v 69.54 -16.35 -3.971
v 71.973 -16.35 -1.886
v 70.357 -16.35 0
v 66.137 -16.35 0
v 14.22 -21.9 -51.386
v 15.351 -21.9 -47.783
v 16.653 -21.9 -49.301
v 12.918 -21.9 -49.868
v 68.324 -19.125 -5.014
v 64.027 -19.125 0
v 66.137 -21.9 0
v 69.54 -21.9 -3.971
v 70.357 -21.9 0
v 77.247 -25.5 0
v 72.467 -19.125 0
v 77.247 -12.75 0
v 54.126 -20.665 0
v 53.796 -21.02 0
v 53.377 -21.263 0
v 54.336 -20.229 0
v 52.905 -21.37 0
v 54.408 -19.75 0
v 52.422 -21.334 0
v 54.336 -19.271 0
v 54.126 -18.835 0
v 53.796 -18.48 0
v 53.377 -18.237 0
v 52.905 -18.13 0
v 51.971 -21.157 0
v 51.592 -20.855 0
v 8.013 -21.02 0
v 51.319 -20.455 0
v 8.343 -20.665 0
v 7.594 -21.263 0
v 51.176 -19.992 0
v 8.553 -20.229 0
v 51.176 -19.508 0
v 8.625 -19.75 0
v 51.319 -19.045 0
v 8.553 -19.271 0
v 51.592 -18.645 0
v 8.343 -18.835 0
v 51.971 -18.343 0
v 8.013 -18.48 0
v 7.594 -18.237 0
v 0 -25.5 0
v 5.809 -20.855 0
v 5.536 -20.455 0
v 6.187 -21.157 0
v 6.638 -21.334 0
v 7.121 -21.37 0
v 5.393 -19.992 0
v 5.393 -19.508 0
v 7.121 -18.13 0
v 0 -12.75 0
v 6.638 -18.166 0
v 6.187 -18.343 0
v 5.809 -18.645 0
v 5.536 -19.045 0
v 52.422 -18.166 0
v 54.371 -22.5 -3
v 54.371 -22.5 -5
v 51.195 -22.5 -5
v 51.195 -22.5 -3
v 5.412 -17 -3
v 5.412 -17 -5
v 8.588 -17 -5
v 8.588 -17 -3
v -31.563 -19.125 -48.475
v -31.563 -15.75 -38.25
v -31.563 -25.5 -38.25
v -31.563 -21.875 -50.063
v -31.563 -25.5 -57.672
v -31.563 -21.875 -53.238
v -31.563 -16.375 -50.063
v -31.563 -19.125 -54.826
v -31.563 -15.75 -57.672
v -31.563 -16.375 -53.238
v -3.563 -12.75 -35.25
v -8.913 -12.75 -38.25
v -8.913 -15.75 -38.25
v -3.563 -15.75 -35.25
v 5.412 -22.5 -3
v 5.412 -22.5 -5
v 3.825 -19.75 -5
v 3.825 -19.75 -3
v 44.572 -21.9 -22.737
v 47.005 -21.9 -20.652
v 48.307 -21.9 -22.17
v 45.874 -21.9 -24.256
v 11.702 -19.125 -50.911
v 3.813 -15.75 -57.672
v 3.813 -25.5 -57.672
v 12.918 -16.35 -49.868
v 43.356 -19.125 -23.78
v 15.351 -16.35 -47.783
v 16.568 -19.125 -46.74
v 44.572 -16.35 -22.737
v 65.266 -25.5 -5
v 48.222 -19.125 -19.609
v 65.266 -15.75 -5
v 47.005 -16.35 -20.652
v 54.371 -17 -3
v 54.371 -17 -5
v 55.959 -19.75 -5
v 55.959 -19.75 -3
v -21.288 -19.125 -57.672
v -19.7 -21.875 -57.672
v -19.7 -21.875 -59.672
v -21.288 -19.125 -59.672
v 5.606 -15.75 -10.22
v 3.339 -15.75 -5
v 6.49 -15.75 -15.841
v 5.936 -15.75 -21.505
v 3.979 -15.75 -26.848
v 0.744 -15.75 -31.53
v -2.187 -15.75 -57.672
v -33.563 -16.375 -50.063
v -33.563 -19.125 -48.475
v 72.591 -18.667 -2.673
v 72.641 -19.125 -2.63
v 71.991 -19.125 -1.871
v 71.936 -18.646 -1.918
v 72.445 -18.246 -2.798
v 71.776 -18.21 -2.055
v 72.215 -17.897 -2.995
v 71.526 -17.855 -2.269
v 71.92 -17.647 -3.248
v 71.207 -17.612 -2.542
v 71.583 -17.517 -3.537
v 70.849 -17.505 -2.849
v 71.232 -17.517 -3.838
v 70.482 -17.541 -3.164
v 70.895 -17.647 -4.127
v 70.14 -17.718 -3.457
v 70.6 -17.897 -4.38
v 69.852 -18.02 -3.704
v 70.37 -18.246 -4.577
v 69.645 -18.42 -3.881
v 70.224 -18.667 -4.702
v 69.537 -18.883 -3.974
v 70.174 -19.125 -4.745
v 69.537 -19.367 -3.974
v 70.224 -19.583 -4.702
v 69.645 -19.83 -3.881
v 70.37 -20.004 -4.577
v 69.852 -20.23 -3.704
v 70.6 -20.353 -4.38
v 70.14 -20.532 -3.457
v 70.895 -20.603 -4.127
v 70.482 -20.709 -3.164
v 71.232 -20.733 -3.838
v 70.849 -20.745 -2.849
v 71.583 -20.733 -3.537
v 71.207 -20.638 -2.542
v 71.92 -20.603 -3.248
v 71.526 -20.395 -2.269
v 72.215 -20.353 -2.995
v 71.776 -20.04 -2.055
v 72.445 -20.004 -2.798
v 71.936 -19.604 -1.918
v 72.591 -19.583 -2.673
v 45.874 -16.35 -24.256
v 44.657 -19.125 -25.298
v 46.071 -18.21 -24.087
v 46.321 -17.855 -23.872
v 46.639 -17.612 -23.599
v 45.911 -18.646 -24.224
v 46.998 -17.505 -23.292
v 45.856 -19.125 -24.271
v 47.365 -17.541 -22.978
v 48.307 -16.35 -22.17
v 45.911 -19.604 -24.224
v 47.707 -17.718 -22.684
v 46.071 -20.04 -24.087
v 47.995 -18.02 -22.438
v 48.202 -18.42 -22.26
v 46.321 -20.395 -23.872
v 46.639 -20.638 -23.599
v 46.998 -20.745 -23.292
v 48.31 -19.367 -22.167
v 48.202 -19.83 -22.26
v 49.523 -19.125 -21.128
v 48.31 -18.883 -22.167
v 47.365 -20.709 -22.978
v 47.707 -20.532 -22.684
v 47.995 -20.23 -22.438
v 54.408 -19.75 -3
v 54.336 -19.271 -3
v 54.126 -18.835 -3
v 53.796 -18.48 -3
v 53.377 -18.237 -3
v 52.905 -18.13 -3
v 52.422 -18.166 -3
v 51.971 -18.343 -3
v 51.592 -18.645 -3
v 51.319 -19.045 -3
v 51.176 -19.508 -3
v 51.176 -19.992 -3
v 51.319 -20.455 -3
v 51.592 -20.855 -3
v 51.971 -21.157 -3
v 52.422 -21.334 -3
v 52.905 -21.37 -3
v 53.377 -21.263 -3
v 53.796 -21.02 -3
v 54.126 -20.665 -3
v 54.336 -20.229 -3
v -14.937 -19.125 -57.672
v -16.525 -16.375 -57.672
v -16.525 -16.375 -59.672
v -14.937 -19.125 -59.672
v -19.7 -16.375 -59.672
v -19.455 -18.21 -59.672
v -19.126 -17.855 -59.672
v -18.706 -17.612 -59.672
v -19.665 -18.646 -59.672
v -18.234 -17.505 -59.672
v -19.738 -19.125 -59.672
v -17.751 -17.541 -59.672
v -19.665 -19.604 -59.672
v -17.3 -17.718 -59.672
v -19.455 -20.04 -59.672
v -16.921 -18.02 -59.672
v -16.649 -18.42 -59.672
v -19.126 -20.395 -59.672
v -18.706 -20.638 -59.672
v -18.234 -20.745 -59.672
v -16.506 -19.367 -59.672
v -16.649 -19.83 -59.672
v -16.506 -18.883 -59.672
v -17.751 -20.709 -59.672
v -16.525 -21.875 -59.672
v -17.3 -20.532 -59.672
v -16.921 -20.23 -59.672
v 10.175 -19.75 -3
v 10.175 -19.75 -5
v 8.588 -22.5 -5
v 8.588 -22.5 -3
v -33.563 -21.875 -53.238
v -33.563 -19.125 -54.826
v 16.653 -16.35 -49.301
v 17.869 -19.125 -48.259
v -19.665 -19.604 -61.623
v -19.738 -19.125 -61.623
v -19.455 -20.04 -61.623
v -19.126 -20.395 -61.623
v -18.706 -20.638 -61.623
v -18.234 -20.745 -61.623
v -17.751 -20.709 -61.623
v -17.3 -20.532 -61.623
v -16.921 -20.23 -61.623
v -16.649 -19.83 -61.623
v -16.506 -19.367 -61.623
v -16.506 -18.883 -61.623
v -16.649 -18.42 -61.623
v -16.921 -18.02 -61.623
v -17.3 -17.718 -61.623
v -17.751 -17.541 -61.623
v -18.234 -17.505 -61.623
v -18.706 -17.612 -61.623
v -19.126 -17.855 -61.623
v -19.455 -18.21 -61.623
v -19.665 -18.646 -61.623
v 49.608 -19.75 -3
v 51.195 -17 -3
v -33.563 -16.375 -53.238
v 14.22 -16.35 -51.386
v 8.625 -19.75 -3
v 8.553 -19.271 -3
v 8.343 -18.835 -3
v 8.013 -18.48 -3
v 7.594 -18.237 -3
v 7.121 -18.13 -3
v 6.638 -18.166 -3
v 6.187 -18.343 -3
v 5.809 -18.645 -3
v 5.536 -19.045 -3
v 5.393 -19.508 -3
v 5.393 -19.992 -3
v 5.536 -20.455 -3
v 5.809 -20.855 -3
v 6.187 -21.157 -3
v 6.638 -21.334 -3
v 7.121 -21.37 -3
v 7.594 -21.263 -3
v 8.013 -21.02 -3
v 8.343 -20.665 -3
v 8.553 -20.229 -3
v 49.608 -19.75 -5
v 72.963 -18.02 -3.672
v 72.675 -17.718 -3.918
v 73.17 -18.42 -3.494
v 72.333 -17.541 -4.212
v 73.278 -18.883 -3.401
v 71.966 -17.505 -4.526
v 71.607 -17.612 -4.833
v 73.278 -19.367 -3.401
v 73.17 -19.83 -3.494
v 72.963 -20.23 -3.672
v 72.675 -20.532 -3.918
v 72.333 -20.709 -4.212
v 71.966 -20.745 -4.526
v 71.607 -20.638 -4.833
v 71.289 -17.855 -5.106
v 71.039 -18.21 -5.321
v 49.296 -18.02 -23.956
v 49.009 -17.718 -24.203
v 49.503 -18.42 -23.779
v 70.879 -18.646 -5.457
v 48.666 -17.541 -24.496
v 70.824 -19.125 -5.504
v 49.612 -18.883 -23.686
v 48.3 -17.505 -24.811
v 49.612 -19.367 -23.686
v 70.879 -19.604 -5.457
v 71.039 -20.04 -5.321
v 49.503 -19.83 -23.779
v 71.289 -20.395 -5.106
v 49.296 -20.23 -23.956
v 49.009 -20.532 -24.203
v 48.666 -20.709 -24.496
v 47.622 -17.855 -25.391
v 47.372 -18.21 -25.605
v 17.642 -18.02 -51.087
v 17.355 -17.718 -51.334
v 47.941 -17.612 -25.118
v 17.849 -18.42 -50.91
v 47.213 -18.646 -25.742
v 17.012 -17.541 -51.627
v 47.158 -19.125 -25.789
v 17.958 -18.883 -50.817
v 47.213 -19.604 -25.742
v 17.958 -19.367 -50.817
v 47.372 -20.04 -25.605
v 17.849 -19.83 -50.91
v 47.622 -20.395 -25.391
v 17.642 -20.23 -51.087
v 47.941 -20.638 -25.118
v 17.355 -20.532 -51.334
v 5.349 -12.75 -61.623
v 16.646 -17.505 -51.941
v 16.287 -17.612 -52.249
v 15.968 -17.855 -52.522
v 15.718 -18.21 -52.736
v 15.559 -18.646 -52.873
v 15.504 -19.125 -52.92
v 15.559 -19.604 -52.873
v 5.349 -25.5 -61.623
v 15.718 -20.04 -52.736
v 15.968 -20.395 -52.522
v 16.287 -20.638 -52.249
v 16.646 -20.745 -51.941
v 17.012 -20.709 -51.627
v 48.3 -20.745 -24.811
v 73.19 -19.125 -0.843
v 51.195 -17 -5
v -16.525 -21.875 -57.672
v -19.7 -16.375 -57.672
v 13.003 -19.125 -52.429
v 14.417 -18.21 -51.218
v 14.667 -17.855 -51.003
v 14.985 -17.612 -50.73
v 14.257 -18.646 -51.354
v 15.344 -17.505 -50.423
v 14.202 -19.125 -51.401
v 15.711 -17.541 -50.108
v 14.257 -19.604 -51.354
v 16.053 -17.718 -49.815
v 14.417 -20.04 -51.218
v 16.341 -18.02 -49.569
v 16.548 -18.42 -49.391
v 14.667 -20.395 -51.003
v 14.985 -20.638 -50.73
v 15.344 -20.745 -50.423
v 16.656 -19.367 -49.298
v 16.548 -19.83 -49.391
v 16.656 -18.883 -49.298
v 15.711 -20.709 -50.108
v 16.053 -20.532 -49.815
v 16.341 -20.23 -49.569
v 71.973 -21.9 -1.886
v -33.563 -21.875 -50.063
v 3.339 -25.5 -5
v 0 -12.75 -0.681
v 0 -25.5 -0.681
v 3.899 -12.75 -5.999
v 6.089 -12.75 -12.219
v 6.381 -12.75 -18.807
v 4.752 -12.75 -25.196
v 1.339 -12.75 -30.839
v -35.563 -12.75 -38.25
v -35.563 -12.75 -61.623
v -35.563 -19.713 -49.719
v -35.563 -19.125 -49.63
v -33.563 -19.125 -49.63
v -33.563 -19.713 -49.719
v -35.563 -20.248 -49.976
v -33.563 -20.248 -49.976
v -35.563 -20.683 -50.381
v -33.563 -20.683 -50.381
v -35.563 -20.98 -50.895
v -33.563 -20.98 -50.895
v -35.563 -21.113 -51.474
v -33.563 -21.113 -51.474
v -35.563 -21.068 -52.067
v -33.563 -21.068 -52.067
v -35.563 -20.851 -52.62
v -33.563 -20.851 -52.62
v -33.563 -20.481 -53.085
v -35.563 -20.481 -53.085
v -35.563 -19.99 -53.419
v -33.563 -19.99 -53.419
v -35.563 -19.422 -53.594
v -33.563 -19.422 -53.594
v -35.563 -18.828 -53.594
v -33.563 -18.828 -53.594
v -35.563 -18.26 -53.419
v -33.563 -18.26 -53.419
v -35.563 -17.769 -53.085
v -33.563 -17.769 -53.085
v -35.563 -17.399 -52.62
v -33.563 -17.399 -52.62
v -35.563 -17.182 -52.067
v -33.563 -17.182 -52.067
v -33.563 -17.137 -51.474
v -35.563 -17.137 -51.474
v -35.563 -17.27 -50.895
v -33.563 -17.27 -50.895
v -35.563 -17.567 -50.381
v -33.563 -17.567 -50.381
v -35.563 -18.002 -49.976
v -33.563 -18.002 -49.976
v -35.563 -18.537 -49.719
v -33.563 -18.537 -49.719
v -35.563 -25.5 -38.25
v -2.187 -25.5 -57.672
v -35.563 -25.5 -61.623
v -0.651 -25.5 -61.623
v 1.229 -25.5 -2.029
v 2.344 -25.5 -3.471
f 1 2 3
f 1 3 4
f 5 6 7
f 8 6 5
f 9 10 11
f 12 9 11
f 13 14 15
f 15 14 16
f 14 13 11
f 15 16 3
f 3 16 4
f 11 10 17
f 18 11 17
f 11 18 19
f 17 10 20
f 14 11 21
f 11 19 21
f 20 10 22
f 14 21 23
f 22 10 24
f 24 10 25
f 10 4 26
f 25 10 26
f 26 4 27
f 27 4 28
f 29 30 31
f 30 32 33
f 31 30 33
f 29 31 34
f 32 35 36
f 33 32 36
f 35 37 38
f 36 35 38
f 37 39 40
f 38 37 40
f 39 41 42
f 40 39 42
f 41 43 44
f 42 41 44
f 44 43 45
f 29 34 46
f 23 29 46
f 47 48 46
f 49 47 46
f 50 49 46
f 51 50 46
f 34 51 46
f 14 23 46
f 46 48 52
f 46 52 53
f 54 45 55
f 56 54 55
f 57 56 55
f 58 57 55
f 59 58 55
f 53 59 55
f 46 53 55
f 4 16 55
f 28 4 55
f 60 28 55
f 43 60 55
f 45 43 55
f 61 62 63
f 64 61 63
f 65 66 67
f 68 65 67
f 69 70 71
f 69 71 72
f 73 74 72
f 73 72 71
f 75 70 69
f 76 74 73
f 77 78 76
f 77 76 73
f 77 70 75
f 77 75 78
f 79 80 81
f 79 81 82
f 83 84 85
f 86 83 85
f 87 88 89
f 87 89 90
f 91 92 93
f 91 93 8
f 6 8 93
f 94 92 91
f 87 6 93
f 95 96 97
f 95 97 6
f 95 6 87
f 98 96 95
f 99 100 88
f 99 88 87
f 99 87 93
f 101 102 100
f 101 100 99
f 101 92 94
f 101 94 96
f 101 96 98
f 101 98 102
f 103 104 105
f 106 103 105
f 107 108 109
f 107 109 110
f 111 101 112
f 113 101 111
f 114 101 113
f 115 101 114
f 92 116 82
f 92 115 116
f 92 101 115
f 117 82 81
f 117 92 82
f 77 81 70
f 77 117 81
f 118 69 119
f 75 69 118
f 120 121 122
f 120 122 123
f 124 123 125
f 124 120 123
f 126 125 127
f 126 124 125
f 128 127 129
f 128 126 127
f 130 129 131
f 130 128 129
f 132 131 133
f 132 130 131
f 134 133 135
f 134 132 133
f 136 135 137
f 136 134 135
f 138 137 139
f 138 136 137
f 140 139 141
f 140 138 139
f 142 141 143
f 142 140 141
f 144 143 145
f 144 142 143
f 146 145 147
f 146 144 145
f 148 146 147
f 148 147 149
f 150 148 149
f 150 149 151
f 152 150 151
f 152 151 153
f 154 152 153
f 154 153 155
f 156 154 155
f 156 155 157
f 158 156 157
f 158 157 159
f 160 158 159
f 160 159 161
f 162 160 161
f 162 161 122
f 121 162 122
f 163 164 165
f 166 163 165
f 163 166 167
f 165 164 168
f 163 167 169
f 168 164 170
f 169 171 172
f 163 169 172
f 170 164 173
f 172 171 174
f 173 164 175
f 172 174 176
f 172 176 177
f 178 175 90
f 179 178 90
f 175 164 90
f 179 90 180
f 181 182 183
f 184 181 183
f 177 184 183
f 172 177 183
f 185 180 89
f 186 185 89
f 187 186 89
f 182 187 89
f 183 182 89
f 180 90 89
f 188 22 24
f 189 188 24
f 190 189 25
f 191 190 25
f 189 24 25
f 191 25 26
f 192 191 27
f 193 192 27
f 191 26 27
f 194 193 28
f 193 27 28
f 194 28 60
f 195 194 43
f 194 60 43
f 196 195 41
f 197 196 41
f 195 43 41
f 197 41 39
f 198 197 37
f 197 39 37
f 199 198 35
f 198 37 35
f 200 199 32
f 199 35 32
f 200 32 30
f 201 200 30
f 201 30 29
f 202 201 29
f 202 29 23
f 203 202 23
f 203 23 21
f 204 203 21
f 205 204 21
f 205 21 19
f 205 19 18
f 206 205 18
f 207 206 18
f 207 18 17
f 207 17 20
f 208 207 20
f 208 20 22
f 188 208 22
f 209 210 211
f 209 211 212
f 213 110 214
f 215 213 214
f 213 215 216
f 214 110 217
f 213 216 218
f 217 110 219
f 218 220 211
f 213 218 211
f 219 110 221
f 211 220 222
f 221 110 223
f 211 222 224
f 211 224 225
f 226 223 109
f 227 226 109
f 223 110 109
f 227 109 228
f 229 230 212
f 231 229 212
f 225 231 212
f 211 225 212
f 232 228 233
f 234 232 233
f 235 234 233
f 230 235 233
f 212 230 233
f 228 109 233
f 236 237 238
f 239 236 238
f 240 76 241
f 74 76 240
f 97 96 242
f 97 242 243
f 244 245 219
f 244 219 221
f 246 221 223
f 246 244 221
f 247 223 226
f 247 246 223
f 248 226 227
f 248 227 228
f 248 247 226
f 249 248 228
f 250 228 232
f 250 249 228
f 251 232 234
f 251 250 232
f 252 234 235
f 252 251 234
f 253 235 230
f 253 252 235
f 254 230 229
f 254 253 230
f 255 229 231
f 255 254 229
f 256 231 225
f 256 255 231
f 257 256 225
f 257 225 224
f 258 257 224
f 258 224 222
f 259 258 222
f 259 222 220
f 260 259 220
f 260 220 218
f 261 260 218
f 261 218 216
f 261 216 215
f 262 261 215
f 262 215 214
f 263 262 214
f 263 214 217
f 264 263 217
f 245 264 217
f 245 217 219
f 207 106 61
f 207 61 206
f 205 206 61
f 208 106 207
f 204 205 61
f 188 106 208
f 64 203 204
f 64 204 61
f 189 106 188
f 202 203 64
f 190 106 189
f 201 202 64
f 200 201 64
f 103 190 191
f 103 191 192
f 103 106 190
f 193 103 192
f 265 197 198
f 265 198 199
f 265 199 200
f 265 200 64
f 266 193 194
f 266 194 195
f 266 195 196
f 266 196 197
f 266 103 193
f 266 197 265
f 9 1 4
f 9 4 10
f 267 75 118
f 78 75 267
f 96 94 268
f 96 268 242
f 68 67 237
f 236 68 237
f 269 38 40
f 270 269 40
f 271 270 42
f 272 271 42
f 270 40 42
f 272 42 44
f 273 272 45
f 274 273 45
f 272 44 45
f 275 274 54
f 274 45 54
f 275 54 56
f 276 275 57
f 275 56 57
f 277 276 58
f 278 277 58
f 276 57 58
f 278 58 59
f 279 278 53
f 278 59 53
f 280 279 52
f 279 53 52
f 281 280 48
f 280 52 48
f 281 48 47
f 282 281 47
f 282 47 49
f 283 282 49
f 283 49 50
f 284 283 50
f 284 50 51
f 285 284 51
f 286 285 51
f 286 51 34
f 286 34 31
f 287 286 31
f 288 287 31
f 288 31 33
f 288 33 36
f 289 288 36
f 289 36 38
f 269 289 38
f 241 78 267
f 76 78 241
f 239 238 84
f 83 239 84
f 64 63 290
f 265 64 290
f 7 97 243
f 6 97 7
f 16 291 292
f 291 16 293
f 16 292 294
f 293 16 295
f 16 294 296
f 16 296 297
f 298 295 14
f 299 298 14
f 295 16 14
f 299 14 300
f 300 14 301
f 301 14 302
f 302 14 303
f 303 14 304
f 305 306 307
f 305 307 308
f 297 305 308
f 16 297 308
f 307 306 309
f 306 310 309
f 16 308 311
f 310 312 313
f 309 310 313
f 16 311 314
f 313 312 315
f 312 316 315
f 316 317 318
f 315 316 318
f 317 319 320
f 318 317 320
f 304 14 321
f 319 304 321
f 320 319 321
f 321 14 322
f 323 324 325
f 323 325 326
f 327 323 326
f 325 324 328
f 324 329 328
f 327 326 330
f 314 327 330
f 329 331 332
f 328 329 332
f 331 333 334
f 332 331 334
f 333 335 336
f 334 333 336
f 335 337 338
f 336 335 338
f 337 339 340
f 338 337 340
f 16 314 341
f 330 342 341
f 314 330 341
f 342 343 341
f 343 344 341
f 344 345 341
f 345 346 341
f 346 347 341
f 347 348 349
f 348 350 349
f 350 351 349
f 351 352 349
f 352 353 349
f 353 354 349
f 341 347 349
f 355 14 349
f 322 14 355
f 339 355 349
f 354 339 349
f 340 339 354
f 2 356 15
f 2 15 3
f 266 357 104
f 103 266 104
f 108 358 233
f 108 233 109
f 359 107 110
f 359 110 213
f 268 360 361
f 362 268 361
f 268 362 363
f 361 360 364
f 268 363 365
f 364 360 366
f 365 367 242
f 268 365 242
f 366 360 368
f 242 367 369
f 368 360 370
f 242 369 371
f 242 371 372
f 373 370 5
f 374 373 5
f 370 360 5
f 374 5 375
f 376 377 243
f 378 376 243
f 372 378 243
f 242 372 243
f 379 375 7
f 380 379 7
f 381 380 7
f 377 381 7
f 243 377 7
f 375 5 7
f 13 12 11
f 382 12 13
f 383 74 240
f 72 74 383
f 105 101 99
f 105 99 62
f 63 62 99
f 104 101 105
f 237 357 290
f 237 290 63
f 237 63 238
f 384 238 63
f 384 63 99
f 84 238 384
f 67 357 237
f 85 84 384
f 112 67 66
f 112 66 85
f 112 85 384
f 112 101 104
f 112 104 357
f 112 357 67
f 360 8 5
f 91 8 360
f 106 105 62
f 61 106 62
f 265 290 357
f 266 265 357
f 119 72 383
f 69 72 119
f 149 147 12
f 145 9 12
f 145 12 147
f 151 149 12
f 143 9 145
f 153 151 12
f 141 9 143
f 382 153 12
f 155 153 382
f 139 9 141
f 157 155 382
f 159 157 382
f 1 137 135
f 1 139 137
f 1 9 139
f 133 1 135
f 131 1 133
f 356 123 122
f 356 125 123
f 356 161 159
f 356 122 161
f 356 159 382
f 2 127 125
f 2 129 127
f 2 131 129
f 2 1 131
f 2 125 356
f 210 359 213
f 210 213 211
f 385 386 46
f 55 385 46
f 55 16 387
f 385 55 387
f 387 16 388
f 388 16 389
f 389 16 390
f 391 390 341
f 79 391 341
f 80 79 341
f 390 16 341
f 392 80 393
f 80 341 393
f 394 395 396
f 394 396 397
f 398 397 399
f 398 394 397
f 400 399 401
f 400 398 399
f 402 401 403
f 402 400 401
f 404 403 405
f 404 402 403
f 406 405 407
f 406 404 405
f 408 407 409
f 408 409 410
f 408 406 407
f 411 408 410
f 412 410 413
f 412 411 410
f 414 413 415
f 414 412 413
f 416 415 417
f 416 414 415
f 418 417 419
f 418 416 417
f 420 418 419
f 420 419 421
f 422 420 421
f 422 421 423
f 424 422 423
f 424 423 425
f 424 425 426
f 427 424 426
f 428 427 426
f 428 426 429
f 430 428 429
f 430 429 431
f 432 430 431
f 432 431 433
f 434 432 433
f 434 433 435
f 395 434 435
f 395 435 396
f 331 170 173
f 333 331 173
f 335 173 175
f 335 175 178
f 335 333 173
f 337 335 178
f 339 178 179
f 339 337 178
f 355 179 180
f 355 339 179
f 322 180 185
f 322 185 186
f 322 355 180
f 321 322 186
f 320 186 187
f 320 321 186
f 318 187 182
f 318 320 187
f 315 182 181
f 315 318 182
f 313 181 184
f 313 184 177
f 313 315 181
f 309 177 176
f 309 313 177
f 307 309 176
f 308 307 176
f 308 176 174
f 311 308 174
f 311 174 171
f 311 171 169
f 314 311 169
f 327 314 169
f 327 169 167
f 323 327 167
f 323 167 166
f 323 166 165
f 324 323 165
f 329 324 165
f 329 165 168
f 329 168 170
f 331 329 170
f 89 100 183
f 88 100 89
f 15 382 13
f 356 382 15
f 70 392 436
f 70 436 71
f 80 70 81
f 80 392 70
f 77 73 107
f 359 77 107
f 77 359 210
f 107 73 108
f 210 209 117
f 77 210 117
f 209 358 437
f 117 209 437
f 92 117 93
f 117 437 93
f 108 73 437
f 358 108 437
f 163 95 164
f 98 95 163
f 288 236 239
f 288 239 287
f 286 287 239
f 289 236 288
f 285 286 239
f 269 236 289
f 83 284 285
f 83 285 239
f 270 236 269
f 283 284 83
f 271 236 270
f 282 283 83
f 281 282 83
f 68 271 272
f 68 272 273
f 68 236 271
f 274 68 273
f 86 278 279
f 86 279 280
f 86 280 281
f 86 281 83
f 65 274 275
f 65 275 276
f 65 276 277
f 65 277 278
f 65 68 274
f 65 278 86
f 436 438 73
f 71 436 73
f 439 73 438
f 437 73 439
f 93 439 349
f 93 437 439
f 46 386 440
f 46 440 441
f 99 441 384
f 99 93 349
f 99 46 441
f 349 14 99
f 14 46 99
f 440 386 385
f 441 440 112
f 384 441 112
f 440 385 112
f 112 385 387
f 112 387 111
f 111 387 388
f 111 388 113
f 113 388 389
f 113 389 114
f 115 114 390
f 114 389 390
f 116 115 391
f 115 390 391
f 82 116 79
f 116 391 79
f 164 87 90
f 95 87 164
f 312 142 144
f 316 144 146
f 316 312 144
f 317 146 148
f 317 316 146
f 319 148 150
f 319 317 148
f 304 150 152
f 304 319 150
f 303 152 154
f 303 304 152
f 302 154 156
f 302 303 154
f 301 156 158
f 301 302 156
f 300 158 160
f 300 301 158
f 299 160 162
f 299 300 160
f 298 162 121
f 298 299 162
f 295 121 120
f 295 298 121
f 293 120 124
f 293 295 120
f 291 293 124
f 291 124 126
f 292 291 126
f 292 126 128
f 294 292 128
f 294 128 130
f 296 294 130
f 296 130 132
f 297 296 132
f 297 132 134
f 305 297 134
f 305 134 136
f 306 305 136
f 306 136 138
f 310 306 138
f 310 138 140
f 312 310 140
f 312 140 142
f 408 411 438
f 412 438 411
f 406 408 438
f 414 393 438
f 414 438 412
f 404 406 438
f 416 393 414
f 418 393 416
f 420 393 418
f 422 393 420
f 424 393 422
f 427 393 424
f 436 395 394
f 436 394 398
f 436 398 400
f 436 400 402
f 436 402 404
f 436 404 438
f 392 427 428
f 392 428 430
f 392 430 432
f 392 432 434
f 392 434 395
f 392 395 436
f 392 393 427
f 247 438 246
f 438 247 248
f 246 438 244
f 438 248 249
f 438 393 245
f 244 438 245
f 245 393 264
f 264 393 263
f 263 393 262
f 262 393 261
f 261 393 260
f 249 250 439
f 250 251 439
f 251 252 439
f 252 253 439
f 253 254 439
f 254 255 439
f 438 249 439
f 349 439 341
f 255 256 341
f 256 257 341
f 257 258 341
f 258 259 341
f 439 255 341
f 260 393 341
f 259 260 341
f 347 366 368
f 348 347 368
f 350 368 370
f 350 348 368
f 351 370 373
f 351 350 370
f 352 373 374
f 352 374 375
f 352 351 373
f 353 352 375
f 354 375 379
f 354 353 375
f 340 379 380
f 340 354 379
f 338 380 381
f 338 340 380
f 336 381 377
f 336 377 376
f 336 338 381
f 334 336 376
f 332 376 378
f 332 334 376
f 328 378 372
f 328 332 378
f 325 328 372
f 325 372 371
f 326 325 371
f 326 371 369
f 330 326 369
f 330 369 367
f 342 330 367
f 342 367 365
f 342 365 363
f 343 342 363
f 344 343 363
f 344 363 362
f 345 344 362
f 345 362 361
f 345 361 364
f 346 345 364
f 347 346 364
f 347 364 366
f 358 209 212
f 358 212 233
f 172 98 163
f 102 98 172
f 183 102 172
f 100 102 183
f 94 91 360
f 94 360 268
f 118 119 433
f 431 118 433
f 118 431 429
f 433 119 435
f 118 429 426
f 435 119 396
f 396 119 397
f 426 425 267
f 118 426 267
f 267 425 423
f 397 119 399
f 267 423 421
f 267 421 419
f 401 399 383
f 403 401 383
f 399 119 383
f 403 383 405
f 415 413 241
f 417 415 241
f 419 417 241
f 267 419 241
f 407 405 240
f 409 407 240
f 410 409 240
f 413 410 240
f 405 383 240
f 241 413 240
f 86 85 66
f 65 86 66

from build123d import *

# Parameters (mm, degrees)
SALIENTE_EXTRUIR1_DEPTH     = 12.75
CORTAR_EXTRUIR1_REACH       = 31.62
CROQUIS2_R                  = 1.625
CROQUIS3_R                  = 22.5
CORTAR_EXTRUIR2_DEPTH       = 13.75
SALIENTE_EXTRUIR2_DEPTH     = 3
SALIENTE_EXTRUIR3_DEPTH     = 9.75
CROQUIS6_R                  = 1.625
CORTAR_EXTRUIR3_DEPTH       = 10
CORTAR_EXTRUIR4_START       = -2
CORTAR_EXTRUIR4_DEPTH       = 10
CORTAR_EXTRUIR5_START       = -2
CORTAR_EXTRUIR5_DEPTH       = 10
CORTAR_EXTRUIR6_DEPTH       = 2
CORTAR_EXTRUIR7_REACH       = 37.25
CROQUIS10_R                 = 1.625
CORTAR_EXTRUIR8_DEPTH       = 2
CROQUIS12_W                 = 92.508691999
CROQUIS12_H                 = 24.255818813
CORTAR_EXTRUIR9_DEPTH       = 1
CORTAR_EXTRUIR9_DEPTH_BACK  = 36.25
SALIENTE_EXTRUIR4_DEPTH     = 12.75
CORTAR_EXTRUIR10_START      = -9.75
CORTAR_EXTRUIR10_DEPTH      = 9.75
CROQUIS16_W                 = 76.692813467
CROQUIS16_H                 = 12.75
CORTAR_EXTRUIR11_DEPTH      = 1
CROQUIS17_W                 = 40.657498706
CROQUIS17_H                 = 22.934549925
CORTAR_EXTRUIR12_DEPTH      = 1
CORTAR_EXTRUIR12_DEPTH_BACK = 13.75
SALIENTE_EXTRUIR5_REACH     = 14.75
CROQUIS18_W                 = 34.9120451
CROQUIS18_H                 = 3.951156815
CROQUIS20_R                 = 1.625
CORTAR_EXTRUIR14_DEPTH      = 10
CORTAR_EXTRUIR15_DEPTH      = 2
CROQUIS22_R                 = 1.625
CORTAR_EXTRUIR16_DEPTH      = 10
CORTAR_EXTRUIR17_DEPTH      = 2
SALIENTE_EXTRUIR6_DEPTH     = 12.75
CORTAR_EXTRUIR18_DEPTH      = 2
CROQUIS28_R                 = 1.625
SALIENTE_EXTRUIR7_DEPTH     = 1
CORTAR_EXTRUIR19_REACH      = 110.346
CROQUIS29_R                 = 1.993280097
CORTAR_EXTRUIR20_DEPTH      = 2
SALIENTE_EXTRUIR8_DEPTH     = 12.75
SALIENTE_EXTRUIR9_START     = -2.904645
SALIENTE_EXTRUIR9_DEPTH     = 5
SALIENTE_EXTRUIR10_REACH    = 76.413
CORTAR_EXTRUIR21_START      = -9.75
CORTAR_EXTRUIR21_DEPTH      = 9.75
CROQUIS36_R                 = 1.625
CORTAR_EXTRUIR22_DEPTH      = 15
CORTAR_EXTRUIR23_DEPTH      = 2
CORTAR_EXTRUIR24_START      = -2
CORTAR_EXTRUIR24_DEPTH      = 73.413335578
CROQUIS19_W                 = 120.448667976
CROQUIS19_H                 = 32.886651308
CORTAR_EXTRUIR13_DEPTH      = 1
CORTAR_EXTRUIR13_DEPTH_BACK = 62.623336743
CORTAR_EXTRUIR25_DEPTH      = 1
CORTAR_EXTRUIR25_DEPTH_BACK = 13.75
CROQUIS42_R                 = 1.625
SALIENTE_EXTRUIR11_DEPTH    = 1


with BuildPart() as part:
    # Croquis1 → Saliente-Extruir1 (new body)
    with BuildSketch(Plane(origin=(0, 0, 0), x_dir=(1, 0, 0), z_dir=(0, 1, 0))):
        Polygon((0, 0), (72.78319995, 0), (38.224450787, 29.62043043), (35.621353918, 26.5833452), (60.803074847, 5), (0, 5), align=None)
    extrude(amount=SALIENTE_EXTRUIR1_DEPTH)

    # Croquis2 → Cortar-Extruir1 (cut, up to next)
    with BuildSketch(Plane.XY, mode=Mode.PRIVATE) as cortar_extruir1_sk1:
        with Locations((52.78319995, 5.75)):
            Circle(CROQUIS2_R)
    cortar_extruir1_tool1 = extrude(cortar_extruir1_sk1.sketch, amount=-CORTAR_EXTRUIR1_REACH, mode=Mode.PRIVATE) & part.part
    add(cortar_extruir1_tool1.solids().sort_by_distance((52.7832, 5.75, 0))[0], mode=Mode.SUBTRACT)
    # Croquis2 → Cortar-Extruir1 (cut, up to next)
    with BuildSketch(Plane.XY, mode=Mode.PRIVATE) as cortar_extruir1_sk2:
        with Locations((6.99999995, 5.75)):
            Circle(CROQUIS2_R)
    cortar_extruir1_tool2 = extrude(cortar_extruir1_sk2.sketch, amount=-CORTAR_EXTRUIR1_REACH, mode=Mode.PRIVATE) & part.part
    add(cortar_extruir1_tool2.solids().sort_by_distance((7, 5.75, 0))[0], mode=Mode.SUBTRACT)

    # Croquis3 → Cortar-Extruir2 (cut, through all)
    with BuildSketch(Plane(origin=(0, 12.75, 0), x_dir=(1, 0, 0), z_dir=(0, 1, 0))):
        with Locations((-16, 16.5)):
            Circle(CROQUIS3_R)
    extrude(amount=-CORTAR_EXTRUIR2_DEPTH, mode=Mode.SUBTRACT)

    # Croquis4 → Saliente-Extruir2 (add)
    with BuildSketch(Plane(origin=(0, 12.75, 0), x_dir=(1, 0, 0), z_dir=(0, 1, 0))):
        with BuildLine():
            Line((38.224450787, 29.62043043), (31.656319269, 35.25))
            Line((31.656319269, 35.25), (-3.562657036, 35.25))
            ThreePointArc((-3.562657036, 35.25), (5.936291456, 21.504909307), (3.339079606, 5))
            Line((3.339079606, 5), (60.803074847, 5))
            Line((60.803074847, 5), (35.621353918, 26.5833452))
            Line((35.621353918, 26.5833452), (38.224450787, 29.62043043))
        make_face()
    extrude(amount=-SALIENTE_EXTRUIR2_DEPTH)

    # Croquis5 → Saliente-Extruir3 (add)
    with BuildSketch(Plane.XZ.offset(-9.75)):
        with BuildLine():
            Line((-3.562657036, -35.25), (31.656319269, -35.25))
            Line((31.656319269, -35.25), (38.224450787, -29.62043043))
            Line((38.224450787, -29.62043043), (35.621353918, -26.5833452))
            Line((35.621353918, -26.5833452), (30.17667434, -31.25))
            Line((30.17667434, -31.25), (0.990806338, -31.25))
            ThreePointArc((0.990806338, -31.25), (-1.15062315, -33.404023402), (-3.562657036, -35.25))
        make_face()
    extrude(amount=SALIENTE_EXTRUIR3_DEPTH)

    # Croquis6 → Cortar-Extruir3 (cut)
    with BuildSketch(Plane(origin=(30.824200619, 0, -35.963211942), x_dir=(-0.759271307, 0, -0.650774217), z_dir=(0.650774217, 0, -0.759271307))):
        with Locations((-47.262195378, 6.375)):
            Circle(CROQUIS6_R)
        with Locations((-16.095943758, 6.375)):
            Circle(CROQUIS6_R)
    extrude(amount=-CORTAR_EXTRUIR3_DEPTH, mode=Mode.SUBTRACT)

    # Croquis7 → Cortar-Extruir4 (cut)
    with BuildSketch(Plane(origin=(28.22110375, 0, -32.926126712), x_dir=(0.759271307, 0, 0.650774217), z_dir=(-0.650774217, 0, 0.759271307)).offset(CORTAR_EXTRUIR4_START)):
        Polygon((48.849908618, 3.625), (50.437621859, 6.375), (48.849908618, 9.125), (45.674482138, 9.125), (44.086768898, 6.375), (45.674482138, 3.625), align=None)
    extrude(amount=CORTAR_EXTRUIR4_DEPTH, mode=Mode.SUBTRACT)

    # Croquis8 → Cortar-Extruir5 (cut)
    with BuildSketch(Plane(origin=(28.22110375, 0, -32.926126712), x_dir=(0.759271307, 0, 0.650774217), z_dir=(-0.650774217, 0, 0.759271307)).offset(CORTAR_EXTRUIR5_START)):
        Polygon((17.683656999, 3.625), (19.271370239, 6.375), (17.683656999, 9.125), (14.508230518, 9.125), (12.920517278, 6.375), (14.508230518, 3.625), align=None)
    extrude(amount=CORTAR_EXTRUIR5_DEPTH, mode=Mode.SUBTRACT)

    # Croquis9 → Cortar-Extruir6 (cut)
    with BuildSketch(Plane(origin=(0, 0, -5), x_dir=(-1, 0, 0), z_dir=(0, 0, -1))):
        Polygon((-5.41228671, 3), (-3.824573469, 5.75), (-5.41228671, 8.5), (-8.58771319, 8.5), (-10.175426431, 5.75), (-8.58771319, 3), align=None)
        Polygon((-51.19548671, 3), (-49.607773469, 5.75), (-51.19548671, 8.5), (-54.37091319, 8.5), (-55.958626431, 5.75), (-54.37091319, 3), align=None)
    extrude(amount=-CORTAR_EXTRUIR6_DEPTH, mode=Mode.SUBTRACT)

    # Croquis10 → Cortar-Extruir7 (cut, up to next)
    with BuildSketch(Plane(origin=(0, 0, -35.25), x_dir=(-1, 0, 0), z_dir=(0, 0, -1)), mode=Mode.PRIVATE) as cortar_extruir7_sk1:
        with Locations((-21.656319269, 6.375)):
            Circle(CROQUIS10_R)
    cortar_extruir7_tool1 = extrude(cortar_extruir7_sk1.sketch, amount=-CORTAR_EXTRUIR7_REACH, mode=Mode.PRIVATE) & part.part
    add(cortar_extruir7_tool1.solids().sort_by_distance((21.656319, 6.375, -35.25))[0], mode=Mode.SUBTRACT)

    # Croquis11 → Cortar-Extruir8 (cut)
    with BuildSketch(Plane.XY.offset(-31.25)):
        Polygon((23.24403251, 3.625), (24.83174575, 6.375), (23.24403251, 9.125), (20.068606029, 9.125), (18.480892789, 6.375), (20.068606029, 3.625), align=None)
    extrude(amount=-CORTAR_EXTRUIR8_DEPTH, mode=Mode.SUBTRACT)

    # Simetría1: part across plane


with BuildPart() as part_1:
    add(part.part)
    add(part.part.mirror(Plane.ZX))

    # Croquis12 → Cortar-Extruir9 (cut, two sides)
    with BuildSketch(Plane(origin=(0, 0, -35.25), x_dir=(-1, 0, 0), z_dir=(0, 0, -1))) as cortar_extruir9_sk:
        with Locations((-33.077560565, 12.127909407)):
            Rectangle(CROQUIS12_W, CROQUIS12_H)
    extrude(amount=CORTAR_EXTRUIR9_DEPTH, mode=Mode.SUBTRACT)
    extrude(cortar_extruir9_sk.sketch, amount=-CORTAR_EXTRUIR9_DEPTH_BACK, mode=Mode.SUBTRACT)

    # Croquis13 → Saliente-Extruir4 (add)
    with BuildSketch(Plane.XZ.offset(12.75)):
        Polygon((-35.562657036, -82.38260805), (-35.562657036, -38.25), (-8.913300435, -38.25), (-3.562657036, -35.25), (31.656319269, -35.25), (0.000162281, -62.38260805), align=None)
    extrude(amount=-SALIENTE_EXTRUIR4_DEPTH)

    # Croquis14 → Cortar-Extruir10 (cut)
    with BuildSketch(Plane(origin=(0, 0, 0), x_dir=(1, 0, 0), z_dir=(0, 1, 0)).offset(CORTAR_EXTRUIR10_START)):
        Polygon((30.17667434, 31.25), (0.990806338, 31.25), (-31.562657036, 38.25), (-31.562657036, 75.543902968), (-2.303881466, 59.089203295), align=None)
    extrude(amount=CORTAR_EXTRUIR10_DEPTH, mode=Mode.SUBTRACT)

    # Croquis16 → Cortar-Extruir11 (cut)
    with BuildSketch(Plane(origin=(30.824200619, 0, -35.963211942), x_dir=(-0.759271307, 0, -0.650774217), z_dir=(0.650774217, 0, -0.759271307))):
        with Locations((2.250462975, -6.375)):
            Rectangle(CROQUIS16_W, CROQUIS16_H)
    extrude(amount=-CORTAR_EXTRUIR11_DEPTH, mode=Mode.SUBTRACT)

    # Croquis17 → Cortar-Extruir12 (cut, two sides)
    with BuildSketch(Plane.XZ.offset(12.75)) as cortar_extruir12_sk:
        with Locations((-20.328587072, -73.090611706)):
            Rectangle(CROQUIS17_W, CROQUIS17_H)
    extrude(amount=CORTAR_EXTRUIR12_DEPTH, mode=Mode.SUBTRACT)
    extrude(cortar_extruir12_sk.sketch, amount=-CORTAR_EXTRUIR12_DEPTH_BACK, mode=Mode.SUBTRACT)

    # Croquis18 → Saliente-Extruir5 (add, up to next)
    with BuildSketch(Plane(origin=(0, 0, 0), x_dir=(1, 0, 0), z_dir=(0, 1, 0)), mode=Mode.PRIVATE) as saliente_extruir5_sk1:
        with Locations((-18.106634486, 59.647758336)):
            Rectangle(CROQUIS18_W, CROQUIS18_H)
    saliente_extruir5_tool1 = extrude(saliente_extruir5_sk1.sketch, amount=-SALIENTE_EXTRUIR5_REACH, mode=Mode.PRIVATE) - part_1.part
    add(saliente_extruir5_tool1.solids().sort_by_distance((-18.106634, 0, -59.647758))[0])

    # Croquis20 → Cortar-Extruir14 (cut)
    with BuildSketch(Plane(origin=(30.173426402, 0, -35.203940634), x_dir=(-0.759271307, 0, -0.650774217), z_dir=(0.650774217, 0, -0.759271307))):
        with Locations((25.596869709, -6.375)):
            Circle(CROQUIS20_R)
        with Locations((-16.095943758, -6.375)):
            Circle(CROQUIS20_R)
    extrude(amount=-CORTAR_EXTRUIR14_DEPTH, mode=Mode.SUBTRACT)

    # Croquis21 → Cortar-Extruir15 (cut)
    with BuildSketch(Plane(origin=(28.22110375, 0, -32.926126712), x_dir=(0.759271307, 0, 0.650774217), z_dir=(-0.650774217, 0, 0.759271307))):
        Polygon((-24.009156469, -9.125), (-22.421443229, -6.375), (-24.009156469, -3.625), (-27.184582949, -3.625), (-28.77229619, -6.375), (-27.184582949, -9.125), align=None)
    extrude(amount=-CORTAR_EXTRUIR15_DEPTH, mode=Mode.SUBTRACT)

    # Croquis22 → Cortar-Extruir16 (cut)
    with BuildSketch(Plane(origin=(0, 0, -61.623336743), x_dir=(-1, 0, 0), z_dir=(0, 0, -1))):
        with Locations((18.112657036, -6.375)):
            Circle(CROQUIS22_R)
    extrude(amount=-CORTAR_EXTRUIR16_DEPTH, mode=Mode.SUBTRACT)

    # Croquis23 → Cortar-Extruir17 (cut)
    with BuildSketch(Plane.XY.offset(-57.672179928)):
        Polygon((-16.524943796, -9.125), (-14.937230556, -6.375), (-16.524943796, -3.625), (-19.700370276, -3.625), (-21.288083517, -6.375), (-19.700370276, -9.125), align=None)
    extrude(amount=-CORTAR_EXTRUIR17_DEPTH, mode=Mode.SUBTRACT)

    # Croquis26 → Saliente-Extruir6 (add)
    with BuildSketch(Plane(origin=(0, 0, 0), x_dir=(1, 0, 0), z_dir=(0, 1, 0))):
        Polygon((60.803074847, 5), (-2.287792345, 59.07541325), (-2.938566562, 58.316141943), (60.15230063, 4.240728693), align=None)
    extrude(amount=-SALIENTE_EXTRUIR6_DEPTH)

    # Croquis27 → Cortar-Extruir18 (cut)
    with BuildSketch(Plane(origin=(27.570329533, 0, -32.166855405), x_dir=(0.759271307, 0, 0.650774217), z_dir=(-0.650774217, 0, 0.759271307))):
        Polygon((-22.421443229, -6.375), (-24.009156469, -3.625), (-27.184582949, -3.625), (-28.77229619, -6.375), (-27.184582949, -9.125), (-24.009156469, -9.125), align=None)
        Polygon((19.271370239, -6.375), (17.683656999, -3.625), (14.508230518, -3.625), (12.920517278, -6.375), (14.508230518, -9.125), (17.683656999, -9.125), align=None)
    extrude(amount=-CORTAR_EXTRUIR18_DEPTH, mode=Mode.SUBTRACT)

    # Croquis28 → Saliente-Extruir7 (add)
    with BuildSketch(Plane(origin=(29.522652185, 0, -34.444669327), x_dir=(0.759271307, 0, 0.650774217), z_dir=(-0.650774217, 0, 0.759271307))):
        Polygon((-24.009156469, -3.625), (-27.184582949, -3.625), (-28.77229619, -6.375), (-27.184582949, -9.125), (-24.009156469, -9.125), (-22.421443229, -6.375), align=None)
        with Locations((-25.596869709, -6.375)):
            Circle(CROQUIS28_R, mode=Mode.SUBTRACT)
        Polygon((17.683656999, -3.625), (14.508230518, -3.625), (12.920517278, -6.375), (14.508230518, -9.125), (17.683656999, -9.125), (19.271370239, -6.375), align=None)
        with Locations((16.095943758, -6.375)):
            Circle(CROQUIS28_R, mode=Mode.SUBTRACT)
    extrude(amount=SALIENTE_EXTRUIR7_DEPTH)

    # Croquis29 → Cortar-Extruir19 (cut, up to next)
    with BuildSketch(Plane.ZY.offset(35.562657036), mode=Mode.PRIVATE) as cortar_extruir19_sk1:
        with Locations((-51.623336743, -6.375)):
            Circle(CROQUIS29_R)
    cortar_extruir19_tool1 = extrude(cortar_extruir19_sk1.sketch, amount=-CORTAR_EXTRUIR19_REACH, mode=Mode.PRIVATE) & part_1.part
    add(cortar_extruir19_tool1.solids().sort_by_distance((-35.562657, -6.375, -51.623337))[0], mode=Mode.SUBTRACT)

    # Croquis30 → Cortar-Extruir20 (cut)
    with BuildSketch(Plane(origin=(-31.562657036, 0, 0), x_dir=(0, 0, -1), z_dir=(1, 0, 0))):
        Polygon((53.238108484, -9.125), (54.825821725, -6.375), (53.238108484, -3.625), (50.062682004, -3.625), (48.474968763, -6.375), (50.062682004, -9.125), align=None)
    extrude(amount=-CORTAR_EXTRUIR20_DEPTH, mode=Mode.SUBTRACT)

    # Croquis32 → Saliente-Extruir8 (add)
    with BuildSketch(Plane.XZ.offset(12.75)):
        Polygon((-0.650611936, -61.623336743), (5.349388064, -61.623336743), (60.1210833, -14.678316233), (60.771857517, -15.43758754), (78.78319995, 0), (72.78319995, 0), (58.230815026, -12.472902396), (57.580040809, -11.713631088), align=None)
    extrude(amount=-SALIENTE_EXTRUIR8_DEPTH)

    # Croquis33 → Saliente-Extruir9 (add)
    with BuildSketch(Plane(origin=(32.714468893, 0, -38.168625779), x_dir=(-0.759271307, 0, -0.650774217), z_dir=(0.650774217, 0, -0.759271307)).offset(SALIENTE_EXTRUIR9_START)):
        Polygon((-14.508230518, -3.625), (-17.683656999, -3.625), (-19.271370239, -6.375), (-17.683656999, -9.125), (-14.508230518, -9.125), (-12.920517278, -6.375), align=None)
        Polygon((27.184582949, -3.625), (24.009156469, -3.625), (22.421443229, -6.375), (24.009156469, -9.125), (27.184582949, -9.125), (28.77229619, -6.375), align=None)
    extrude(amount=-SALIENTE_EXTRUIR9_DEPTH)

    # Saliente-Extruir10: up to this face of the body (flat: up to its plane)
    saliente_extruir10_end = Plane(part_1.part.faces().sort_by_distance((38.729797406, -6.385876659, 0))[0])
    # Croquis34 → Saliente-Extruir10 (add, up to the picked face)
    with BuildSketch(Plane(origin=(33.36524311, 0, -38.927897086), x_dir=(-0.759271307, 0, -0.650774217), z_dir=(0.650774217, 0, -0.759271307)), mode=Mode.PRIVATE) as saliente_extruir10_sk1:
        Polygon((-45.674482138, -3.625), (-48.849908618, -3.625), (-50.437621859, -6.375), (-48.849908618, -9.125), (-45.674482138, -9.125), (-44.086768898, -6.375), align=None)
    saliente_extruir10_tool1 = split(extrude(saliente_extruir10_sk1.sketch, amount=-SALIENTE_EXTRUIR10_REACH, mode=Mode.PRIVATE), bisect_by=saliente_extruir10_end, keep=Keep.BOTH, mode=Mode.PRIVATE)
    add(saliente_extruir10_tool1.solids().sort_by_distance((69.250072, -6.375, -8.170879))[0])

    # Croquis35 → Cortar-Extruir21 (cut)
    with BuildSketch(Plane(origin=(0, 0, 0), x_dir=(1, 0, 0), z_dir=(0, 1, 0)).offset(CORTAR_EXTRUIR21_START)):
        Polygon((-2.187243188, 57.672179928), (3.812756812, 57.672179928), (65.266443595, 5), (59.266443595, 5), align=None)
    extrude(amount=CORTAR_EXTRUIR21_DEPTH, mode=Mode.SUBTRACT)

    # Croquis36 → Cortar-Extruir22 (cut)
    with BuildSketch(Plane(origin=(33.36524311, 0, -38.927897086), x_dir=(-0.759271307, 0, -0.650774217), z_dir=(0.650774217, 0, -0.759271307))):
        with Locations((-51.817823222, -6.375)):
            Circle(CROQUIS36_R)
        with Locations((-20.647823222, -6.375)):
            Circle(CROQUIS36_R)
        with Locations((21.042176778, -6.375)):
            Circle(CROQUIS36_R)
    extrude(amount=-CORTAR_EXTRUIR22_DEPTH, mode=Mode.SUBTRACT)

    # Croquis38 → Cortar-Extruir23 (cut)
    with BuildSketch(Plane(origin=(30.111372024, 0, -35.131540549), x_dir=(0.759271307, 0, 0.650774217), z_dir=(-0.650774217, 0, 0.759271307))):
        Polygon((-19.440029781, -9.15), (-17.837882784, -6.375), (-19.440029781, -3.6), (-22.644323775, -3.6), (-24.246470772, -6.375), (-22.644323775, -9.15), align=None)
        Polygon((22.249970219, -9.15), (23.852117216, -6.375), (22.249970219, -3.6), (19.045676225, -3.6), (17.443529228, -6.375), (19.045676225, -9.15), align=None)
    extrude(amount=-CORTAR_EXTRUIR23_DEPTH, mode=Mode.SUBTRACT)

    # Croquis39 → Cortar-Extruir24 (cut, through all)
    with BuildSketch(Plane(origin=(33.36524311, 0, -38.927897086), x_dir=(-0.759271307, 0, -0.650774217), z_dir=(0.650774217, 0, -0.759271307)).offset(CORTAR_EXTRUIR24_START)):
        Polygon((-50.215676225, -9.15), (-48.613529228, -6.375), (-50.215676225, -3.6), (-53.419970219, -3.6), (-55.022117216, -6.375), (-53.419970219, -9.15), align=None)
    extrude(amount=-CORTAR_EXTRUIR24_DEPTH, mode=Mode.SUBTRACT)

    # Simetría2: part across face


with BuildPart() as part_2:
    add(part_1.part)
    add(part_1.part.mirror(Plane(origin=(15.909867024, -12.75, -29.216307939), x_dir=(0, 0, 1), z_dir=(0, -1, 0))))

    # Croquis19 → Cortar-Extruir13 (cut, two sides)
    with BuildSketch(Plane(origin=(0, 0, -61.623336743), x_dir=(-1, 0, 0), z_dir=(0, 0, -1))) as cortar_extruir13_sk:
        with Locations((-18.558865962, 3.693325654)):
            Rectangle(CROQUIS19_W, CROQUIS19_H)
    extrude(amount=CORTAR_EXTRUIR13_DEPTH, mode=Mode.SUBTRACT)
    extrude(cortar_extruir13_sk.sketch, amount=-CORTAR_EXTRUIR13_DEPTH_BACK, mode=Mode.SUBTRACT)

    # Croquis40 → Cortar-Extruir25 (cut, two sides)
    with BuildSketch(Plane.XZ.offset(25.5)) as cortar_extruir25_sk:
        Polygon((60.1210833, -14.678316233), (60.771857517, -15.43758754), (81.920264416, 2.688789439), (81.269490199, 3.448060746), align=None)
    extrude(amount=CORTAR_EXTRUIR25_DEPTH, mode=Mode.SUBTRACT)
    extrude(cortar_extruir25_sk.sketch, amount=-CORTAR_EXTRUIR25_DEPTH_BACK, mode=Mode.SUBTRACT)

    # Croquis42 → Saliente-Extruir11 (add)
    with BuildSketch(Plane(origin=(32.063694676, 0, -37.409354471), x_dir=(0.759271307, 0, 0.650774217), z_dir=(-0.650774217, 0, 0.759271307))):
        Polygon((53.419970219, -16.35), (50.215676225, -16.35), (48.613529228, -19.125), (50.215676225, -21.9), (53.419970219, -21.9), (55.022117216, -19.125), align=None)
        with Locations((51.817823222, -19.125)):
            Circle(CROQUIS42_R, mode=Mode.SUBTRACT)
    extrude(amount=SALIENTE_EXTRUIR11_DEPTH)


solid = part_2.part
